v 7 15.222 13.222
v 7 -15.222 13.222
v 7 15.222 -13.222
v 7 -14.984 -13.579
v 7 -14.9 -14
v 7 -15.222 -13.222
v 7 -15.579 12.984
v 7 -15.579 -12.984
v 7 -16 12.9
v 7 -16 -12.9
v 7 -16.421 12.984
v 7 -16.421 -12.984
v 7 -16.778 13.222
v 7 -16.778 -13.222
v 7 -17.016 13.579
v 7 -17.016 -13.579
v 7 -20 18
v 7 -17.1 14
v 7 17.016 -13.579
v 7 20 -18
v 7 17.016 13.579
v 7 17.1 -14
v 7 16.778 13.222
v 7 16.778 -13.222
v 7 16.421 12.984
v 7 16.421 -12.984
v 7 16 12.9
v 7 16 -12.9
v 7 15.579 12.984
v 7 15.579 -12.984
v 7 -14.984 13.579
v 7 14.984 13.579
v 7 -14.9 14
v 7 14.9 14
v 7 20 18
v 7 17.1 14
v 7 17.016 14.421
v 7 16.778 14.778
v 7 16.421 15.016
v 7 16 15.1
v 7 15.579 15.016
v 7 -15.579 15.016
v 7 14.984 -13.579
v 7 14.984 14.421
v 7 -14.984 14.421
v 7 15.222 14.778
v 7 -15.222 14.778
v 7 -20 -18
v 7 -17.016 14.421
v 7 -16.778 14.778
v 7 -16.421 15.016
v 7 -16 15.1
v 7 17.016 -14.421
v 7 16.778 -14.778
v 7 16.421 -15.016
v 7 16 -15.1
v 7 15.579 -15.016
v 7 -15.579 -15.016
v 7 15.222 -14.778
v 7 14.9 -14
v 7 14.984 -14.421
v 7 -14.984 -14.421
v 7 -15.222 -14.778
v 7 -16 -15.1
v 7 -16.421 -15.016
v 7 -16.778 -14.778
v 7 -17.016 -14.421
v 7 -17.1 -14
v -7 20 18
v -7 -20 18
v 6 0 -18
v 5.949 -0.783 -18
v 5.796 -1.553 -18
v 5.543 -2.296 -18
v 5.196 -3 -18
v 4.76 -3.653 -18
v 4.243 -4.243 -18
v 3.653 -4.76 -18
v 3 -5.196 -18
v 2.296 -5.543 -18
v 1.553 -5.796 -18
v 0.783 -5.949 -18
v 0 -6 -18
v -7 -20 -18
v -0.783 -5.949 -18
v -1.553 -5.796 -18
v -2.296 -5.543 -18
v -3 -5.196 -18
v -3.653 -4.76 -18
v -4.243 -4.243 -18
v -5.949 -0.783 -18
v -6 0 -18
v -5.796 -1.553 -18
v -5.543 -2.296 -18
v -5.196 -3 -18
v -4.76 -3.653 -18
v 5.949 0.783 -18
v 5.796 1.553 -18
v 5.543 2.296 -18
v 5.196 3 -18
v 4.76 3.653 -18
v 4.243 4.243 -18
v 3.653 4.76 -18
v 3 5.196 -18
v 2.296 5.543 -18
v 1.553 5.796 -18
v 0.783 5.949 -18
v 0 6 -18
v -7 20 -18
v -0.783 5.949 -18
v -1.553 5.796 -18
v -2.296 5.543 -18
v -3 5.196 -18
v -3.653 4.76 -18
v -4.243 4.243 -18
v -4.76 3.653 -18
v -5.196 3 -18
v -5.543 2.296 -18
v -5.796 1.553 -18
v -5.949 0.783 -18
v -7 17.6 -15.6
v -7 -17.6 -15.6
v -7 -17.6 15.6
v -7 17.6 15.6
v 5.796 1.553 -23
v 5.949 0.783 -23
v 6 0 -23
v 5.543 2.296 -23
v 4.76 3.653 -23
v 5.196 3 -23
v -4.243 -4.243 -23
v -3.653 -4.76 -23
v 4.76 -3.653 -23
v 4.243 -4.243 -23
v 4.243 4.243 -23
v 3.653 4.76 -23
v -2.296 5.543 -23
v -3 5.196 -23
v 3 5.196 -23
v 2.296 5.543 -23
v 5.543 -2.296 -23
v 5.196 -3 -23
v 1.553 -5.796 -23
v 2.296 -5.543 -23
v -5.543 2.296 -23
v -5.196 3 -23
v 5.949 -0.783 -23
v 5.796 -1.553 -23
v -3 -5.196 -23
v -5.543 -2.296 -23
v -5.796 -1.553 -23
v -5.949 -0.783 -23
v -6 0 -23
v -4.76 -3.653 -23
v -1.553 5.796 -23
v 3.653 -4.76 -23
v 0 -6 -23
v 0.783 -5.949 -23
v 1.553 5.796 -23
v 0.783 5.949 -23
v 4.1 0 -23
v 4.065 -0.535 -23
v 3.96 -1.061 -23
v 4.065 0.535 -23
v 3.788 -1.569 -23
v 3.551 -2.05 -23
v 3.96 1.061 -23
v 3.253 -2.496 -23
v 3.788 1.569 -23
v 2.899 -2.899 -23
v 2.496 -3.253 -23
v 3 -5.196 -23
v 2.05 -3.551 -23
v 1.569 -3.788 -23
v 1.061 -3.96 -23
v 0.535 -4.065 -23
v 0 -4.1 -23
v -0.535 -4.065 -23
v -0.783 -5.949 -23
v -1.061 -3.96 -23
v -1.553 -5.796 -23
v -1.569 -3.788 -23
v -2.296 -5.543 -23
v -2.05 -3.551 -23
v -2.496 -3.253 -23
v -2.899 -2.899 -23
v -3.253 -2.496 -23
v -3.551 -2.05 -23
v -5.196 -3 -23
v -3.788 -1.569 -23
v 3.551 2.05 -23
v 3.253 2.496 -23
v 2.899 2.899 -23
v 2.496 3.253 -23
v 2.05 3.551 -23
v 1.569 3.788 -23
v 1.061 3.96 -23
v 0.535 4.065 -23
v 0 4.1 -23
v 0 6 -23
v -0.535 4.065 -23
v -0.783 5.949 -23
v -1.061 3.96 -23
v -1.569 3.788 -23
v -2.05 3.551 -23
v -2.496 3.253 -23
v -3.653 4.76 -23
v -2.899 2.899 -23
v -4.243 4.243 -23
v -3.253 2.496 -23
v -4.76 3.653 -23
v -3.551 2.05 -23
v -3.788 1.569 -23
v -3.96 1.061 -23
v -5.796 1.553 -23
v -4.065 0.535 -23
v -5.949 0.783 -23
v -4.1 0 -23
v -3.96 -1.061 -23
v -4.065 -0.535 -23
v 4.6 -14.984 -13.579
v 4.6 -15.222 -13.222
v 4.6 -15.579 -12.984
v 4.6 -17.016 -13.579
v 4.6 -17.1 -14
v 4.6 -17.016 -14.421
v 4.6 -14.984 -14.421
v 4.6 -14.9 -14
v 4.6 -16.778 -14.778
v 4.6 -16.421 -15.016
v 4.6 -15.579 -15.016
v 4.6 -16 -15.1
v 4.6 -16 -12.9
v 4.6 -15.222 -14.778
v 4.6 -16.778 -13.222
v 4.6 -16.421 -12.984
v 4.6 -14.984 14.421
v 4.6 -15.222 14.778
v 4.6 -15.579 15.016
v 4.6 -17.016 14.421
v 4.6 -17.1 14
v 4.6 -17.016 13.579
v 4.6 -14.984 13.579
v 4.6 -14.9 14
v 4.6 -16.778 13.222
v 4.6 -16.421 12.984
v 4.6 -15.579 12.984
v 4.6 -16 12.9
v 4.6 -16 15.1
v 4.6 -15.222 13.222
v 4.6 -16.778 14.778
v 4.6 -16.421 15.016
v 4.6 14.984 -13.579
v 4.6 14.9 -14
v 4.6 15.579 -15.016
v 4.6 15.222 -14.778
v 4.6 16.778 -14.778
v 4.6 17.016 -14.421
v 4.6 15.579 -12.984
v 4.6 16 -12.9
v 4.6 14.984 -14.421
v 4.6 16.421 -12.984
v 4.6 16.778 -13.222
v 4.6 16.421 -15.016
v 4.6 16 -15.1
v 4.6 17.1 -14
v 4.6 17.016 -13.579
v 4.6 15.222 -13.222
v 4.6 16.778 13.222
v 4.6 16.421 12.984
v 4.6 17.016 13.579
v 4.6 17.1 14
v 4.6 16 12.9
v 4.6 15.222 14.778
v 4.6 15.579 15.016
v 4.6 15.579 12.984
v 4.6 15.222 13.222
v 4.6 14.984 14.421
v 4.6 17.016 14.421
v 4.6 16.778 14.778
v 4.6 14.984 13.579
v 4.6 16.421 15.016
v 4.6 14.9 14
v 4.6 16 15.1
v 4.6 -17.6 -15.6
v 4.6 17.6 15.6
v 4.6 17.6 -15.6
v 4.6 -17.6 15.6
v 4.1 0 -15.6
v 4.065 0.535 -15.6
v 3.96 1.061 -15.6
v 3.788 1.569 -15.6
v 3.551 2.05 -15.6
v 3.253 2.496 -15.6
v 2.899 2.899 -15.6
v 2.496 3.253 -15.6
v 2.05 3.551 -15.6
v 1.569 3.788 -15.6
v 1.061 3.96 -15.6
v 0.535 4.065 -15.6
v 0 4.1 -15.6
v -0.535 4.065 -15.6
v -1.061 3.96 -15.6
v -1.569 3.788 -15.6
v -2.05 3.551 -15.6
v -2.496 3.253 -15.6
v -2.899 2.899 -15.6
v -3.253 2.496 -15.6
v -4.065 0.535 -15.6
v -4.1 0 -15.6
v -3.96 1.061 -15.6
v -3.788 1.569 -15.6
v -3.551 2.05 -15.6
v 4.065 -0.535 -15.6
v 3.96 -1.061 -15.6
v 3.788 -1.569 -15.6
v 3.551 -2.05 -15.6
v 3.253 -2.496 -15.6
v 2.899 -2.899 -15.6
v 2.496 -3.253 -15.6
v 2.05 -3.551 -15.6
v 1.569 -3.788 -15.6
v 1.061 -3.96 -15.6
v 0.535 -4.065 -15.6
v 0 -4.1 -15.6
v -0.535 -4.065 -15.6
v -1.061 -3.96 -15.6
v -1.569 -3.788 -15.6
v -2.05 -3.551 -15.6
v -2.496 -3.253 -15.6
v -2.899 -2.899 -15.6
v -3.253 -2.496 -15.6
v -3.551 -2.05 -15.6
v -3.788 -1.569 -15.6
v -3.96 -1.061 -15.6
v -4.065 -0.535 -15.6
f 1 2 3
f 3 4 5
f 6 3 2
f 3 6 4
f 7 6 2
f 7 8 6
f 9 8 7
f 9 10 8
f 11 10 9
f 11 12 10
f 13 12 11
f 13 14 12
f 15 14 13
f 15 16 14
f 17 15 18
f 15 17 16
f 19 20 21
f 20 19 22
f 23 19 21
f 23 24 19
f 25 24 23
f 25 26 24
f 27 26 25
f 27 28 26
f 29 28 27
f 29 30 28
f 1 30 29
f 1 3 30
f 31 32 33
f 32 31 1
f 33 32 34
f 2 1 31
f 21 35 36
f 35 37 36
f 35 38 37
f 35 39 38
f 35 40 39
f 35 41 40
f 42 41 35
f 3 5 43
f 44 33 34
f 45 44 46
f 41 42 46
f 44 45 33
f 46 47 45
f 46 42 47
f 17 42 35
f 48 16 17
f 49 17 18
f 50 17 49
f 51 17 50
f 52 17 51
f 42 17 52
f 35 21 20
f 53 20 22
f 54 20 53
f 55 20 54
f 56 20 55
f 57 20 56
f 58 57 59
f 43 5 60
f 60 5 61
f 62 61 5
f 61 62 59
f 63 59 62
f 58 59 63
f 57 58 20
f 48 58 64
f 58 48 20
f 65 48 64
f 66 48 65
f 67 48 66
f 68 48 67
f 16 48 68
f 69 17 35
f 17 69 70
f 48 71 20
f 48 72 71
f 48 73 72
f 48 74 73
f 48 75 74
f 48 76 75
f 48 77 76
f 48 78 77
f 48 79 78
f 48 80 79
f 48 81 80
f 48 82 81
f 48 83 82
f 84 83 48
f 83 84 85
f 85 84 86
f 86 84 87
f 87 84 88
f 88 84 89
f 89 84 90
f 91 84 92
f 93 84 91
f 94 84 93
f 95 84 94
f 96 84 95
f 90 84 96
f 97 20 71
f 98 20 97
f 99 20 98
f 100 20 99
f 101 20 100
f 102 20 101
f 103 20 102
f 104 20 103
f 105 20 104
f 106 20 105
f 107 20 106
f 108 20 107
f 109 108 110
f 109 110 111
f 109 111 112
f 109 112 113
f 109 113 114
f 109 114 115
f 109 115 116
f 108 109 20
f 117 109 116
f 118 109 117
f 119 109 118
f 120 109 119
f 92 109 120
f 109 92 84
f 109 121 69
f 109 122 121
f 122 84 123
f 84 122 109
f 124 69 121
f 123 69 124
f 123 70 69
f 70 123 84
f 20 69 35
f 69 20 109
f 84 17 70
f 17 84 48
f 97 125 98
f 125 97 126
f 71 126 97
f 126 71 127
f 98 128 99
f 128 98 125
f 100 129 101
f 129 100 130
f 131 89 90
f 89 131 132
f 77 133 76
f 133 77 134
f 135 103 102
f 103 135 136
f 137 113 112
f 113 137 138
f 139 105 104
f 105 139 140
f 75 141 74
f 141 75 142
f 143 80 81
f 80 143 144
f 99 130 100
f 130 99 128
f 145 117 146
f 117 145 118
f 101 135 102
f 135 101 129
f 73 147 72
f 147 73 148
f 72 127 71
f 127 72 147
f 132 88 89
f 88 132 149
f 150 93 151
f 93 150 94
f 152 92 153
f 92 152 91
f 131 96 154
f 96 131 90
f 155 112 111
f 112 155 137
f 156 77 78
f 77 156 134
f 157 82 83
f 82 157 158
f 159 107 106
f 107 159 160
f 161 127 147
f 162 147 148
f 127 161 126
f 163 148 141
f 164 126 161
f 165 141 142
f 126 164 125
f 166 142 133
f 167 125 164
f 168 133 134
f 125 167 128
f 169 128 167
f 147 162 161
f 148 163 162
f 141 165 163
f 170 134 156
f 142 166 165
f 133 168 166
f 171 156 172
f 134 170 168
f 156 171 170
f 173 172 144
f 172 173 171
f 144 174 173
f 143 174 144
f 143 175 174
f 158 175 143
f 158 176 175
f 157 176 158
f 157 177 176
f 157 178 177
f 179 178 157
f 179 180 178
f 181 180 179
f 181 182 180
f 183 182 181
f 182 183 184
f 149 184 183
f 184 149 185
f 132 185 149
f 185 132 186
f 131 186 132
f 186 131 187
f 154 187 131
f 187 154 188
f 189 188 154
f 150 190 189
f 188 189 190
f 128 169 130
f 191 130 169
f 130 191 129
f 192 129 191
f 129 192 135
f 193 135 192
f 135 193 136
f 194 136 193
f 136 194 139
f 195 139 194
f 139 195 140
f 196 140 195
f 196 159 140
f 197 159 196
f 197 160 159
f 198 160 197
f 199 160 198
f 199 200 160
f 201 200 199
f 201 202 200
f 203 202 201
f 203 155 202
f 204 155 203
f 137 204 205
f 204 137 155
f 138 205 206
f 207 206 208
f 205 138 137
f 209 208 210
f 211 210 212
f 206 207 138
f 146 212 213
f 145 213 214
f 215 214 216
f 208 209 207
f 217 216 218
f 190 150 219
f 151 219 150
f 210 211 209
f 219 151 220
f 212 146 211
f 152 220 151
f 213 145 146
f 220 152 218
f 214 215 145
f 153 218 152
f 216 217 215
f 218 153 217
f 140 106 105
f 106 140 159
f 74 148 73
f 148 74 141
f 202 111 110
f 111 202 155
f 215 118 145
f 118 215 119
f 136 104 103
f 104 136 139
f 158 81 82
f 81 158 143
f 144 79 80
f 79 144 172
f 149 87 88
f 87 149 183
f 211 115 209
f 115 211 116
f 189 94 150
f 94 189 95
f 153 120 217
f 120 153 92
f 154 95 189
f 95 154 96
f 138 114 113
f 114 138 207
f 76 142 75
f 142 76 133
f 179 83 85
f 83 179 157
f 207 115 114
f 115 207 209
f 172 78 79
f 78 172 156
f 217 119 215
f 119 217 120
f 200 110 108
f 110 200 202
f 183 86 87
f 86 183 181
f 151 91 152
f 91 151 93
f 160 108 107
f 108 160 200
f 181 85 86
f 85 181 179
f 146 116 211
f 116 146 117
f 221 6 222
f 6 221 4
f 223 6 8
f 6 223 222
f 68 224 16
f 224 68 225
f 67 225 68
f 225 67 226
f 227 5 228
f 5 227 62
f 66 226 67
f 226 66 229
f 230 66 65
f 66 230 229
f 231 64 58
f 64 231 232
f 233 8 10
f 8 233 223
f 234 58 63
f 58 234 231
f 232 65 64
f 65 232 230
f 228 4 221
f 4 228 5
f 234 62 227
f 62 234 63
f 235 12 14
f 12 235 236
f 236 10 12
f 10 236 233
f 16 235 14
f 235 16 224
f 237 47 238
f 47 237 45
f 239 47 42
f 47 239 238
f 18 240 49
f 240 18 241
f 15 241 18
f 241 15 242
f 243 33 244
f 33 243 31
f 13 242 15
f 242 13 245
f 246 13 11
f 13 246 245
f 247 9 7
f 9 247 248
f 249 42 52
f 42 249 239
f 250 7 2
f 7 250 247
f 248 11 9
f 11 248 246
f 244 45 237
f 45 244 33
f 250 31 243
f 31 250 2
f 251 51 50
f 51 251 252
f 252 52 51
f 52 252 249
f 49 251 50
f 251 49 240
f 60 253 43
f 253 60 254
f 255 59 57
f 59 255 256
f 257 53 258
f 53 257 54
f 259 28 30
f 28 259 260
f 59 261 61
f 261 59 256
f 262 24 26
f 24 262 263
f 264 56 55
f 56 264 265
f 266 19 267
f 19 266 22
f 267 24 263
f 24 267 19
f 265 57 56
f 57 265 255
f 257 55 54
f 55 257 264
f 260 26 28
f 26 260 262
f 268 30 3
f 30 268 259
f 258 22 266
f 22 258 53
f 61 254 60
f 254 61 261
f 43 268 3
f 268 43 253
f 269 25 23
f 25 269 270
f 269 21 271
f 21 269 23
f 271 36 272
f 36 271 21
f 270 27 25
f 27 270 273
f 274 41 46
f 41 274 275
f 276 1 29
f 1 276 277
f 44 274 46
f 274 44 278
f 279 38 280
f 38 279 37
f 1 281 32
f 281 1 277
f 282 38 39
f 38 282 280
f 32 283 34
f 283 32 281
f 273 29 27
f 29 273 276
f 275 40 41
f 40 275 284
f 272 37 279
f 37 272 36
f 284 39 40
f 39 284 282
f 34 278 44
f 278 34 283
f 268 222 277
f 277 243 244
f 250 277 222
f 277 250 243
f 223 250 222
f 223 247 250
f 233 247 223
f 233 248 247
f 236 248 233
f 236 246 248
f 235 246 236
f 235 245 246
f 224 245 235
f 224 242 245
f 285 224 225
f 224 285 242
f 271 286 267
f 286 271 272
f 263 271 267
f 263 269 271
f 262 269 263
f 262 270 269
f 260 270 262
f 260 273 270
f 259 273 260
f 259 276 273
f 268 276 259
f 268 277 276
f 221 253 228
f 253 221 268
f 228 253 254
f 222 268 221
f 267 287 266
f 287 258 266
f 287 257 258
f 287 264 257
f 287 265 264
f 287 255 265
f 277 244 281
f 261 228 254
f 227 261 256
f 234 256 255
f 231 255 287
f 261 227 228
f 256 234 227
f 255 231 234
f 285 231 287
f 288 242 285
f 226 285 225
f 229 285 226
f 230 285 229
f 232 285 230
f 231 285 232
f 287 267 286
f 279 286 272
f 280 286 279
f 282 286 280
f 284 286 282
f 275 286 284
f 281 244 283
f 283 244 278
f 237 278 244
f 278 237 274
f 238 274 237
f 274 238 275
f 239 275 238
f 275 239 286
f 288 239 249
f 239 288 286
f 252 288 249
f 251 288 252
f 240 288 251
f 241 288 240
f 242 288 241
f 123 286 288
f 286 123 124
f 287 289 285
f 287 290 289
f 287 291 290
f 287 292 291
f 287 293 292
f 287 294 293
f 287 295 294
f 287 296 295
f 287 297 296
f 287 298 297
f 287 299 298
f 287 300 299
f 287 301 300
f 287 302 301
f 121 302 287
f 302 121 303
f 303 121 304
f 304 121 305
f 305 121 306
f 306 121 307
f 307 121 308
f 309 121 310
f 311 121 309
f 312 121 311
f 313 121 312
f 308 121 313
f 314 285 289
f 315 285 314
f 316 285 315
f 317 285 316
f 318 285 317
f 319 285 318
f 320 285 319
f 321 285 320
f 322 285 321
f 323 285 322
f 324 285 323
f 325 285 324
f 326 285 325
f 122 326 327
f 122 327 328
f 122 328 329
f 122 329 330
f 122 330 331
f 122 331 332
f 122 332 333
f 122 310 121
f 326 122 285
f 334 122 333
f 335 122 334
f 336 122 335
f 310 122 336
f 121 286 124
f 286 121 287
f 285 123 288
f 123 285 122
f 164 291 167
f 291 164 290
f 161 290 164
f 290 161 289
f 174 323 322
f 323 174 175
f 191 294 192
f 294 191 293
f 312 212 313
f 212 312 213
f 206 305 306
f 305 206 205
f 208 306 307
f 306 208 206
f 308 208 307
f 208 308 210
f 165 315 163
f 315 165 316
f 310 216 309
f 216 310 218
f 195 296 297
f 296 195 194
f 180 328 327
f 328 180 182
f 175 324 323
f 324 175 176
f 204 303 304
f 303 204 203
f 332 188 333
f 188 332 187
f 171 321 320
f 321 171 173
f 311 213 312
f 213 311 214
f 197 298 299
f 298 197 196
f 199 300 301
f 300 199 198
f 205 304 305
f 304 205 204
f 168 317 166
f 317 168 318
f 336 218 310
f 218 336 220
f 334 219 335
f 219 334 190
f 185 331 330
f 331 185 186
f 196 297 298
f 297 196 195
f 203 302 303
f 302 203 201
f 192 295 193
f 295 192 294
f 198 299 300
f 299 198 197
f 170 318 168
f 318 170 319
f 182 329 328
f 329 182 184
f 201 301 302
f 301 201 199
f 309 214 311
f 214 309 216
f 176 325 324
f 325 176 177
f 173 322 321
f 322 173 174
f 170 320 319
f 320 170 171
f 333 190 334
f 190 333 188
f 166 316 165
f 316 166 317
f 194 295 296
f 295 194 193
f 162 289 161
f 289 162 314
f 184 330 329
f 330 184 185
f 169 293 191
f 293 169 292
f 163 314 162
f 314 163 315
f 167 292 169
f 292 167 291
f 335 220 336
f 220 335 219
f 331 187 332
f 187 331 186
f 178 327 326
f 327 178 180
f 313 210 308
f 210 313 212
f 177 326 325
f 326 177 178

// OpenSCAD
// file: phytohydra_params.scad
// PhytoHydra v1 - shared parameters (all dimensions in mm)
// Open any part file in OpenSCAD (free, openscad.org), press F6, then File > Export > STL.
trunk_d      = 170;   // measure girth with a tape: trunk_d = girth / 3.1416
trunk_r      = trunk_d / 2;
wall         = 2.4;   // printed wall thickness (PA12, ASA or PETG)
strap_w      = 20;    // TPU strap / stainless band width
strap_t      = 2.2;
$fn          = 96;
// main file
// Electrode pod cover with M8 connector boss (bottom exit, drip-safe)
include <phytohydra_params.scad>;
cov_w = 40; cov_h = 36; cov_d = 14;
difference() {
    union() {
        cube([cov_d, cov_w, cov_h], center = true);
        translate([0, 0, -cov_h/2 - 5]) cylinder(d = 12, h = 6, $fn = 48);   // M8 boss
    }
    translate([-wall, 0, 0]) cube([cov_d, cov_w - 2*wall, cov_h - 2*wall], center = true); // hollow, open toward base
    translate([0, 0, -cov_h/2 - 6]) cylinder(d = 8.2, h = 10, $fn = 48);                    // M8 thread bore (tap or insert)
    for (y = [-cov_w/2 + 4, cov_w/2 - 4], z = [-cov_h/2 + 4, cov_h/2 - 4])
        translate([-cov_d/2 - 1, y, z]) rotate([0, 90, 0]) cylinder(d = 2.2, h = cov_d + 2, $fn = 16);
}
